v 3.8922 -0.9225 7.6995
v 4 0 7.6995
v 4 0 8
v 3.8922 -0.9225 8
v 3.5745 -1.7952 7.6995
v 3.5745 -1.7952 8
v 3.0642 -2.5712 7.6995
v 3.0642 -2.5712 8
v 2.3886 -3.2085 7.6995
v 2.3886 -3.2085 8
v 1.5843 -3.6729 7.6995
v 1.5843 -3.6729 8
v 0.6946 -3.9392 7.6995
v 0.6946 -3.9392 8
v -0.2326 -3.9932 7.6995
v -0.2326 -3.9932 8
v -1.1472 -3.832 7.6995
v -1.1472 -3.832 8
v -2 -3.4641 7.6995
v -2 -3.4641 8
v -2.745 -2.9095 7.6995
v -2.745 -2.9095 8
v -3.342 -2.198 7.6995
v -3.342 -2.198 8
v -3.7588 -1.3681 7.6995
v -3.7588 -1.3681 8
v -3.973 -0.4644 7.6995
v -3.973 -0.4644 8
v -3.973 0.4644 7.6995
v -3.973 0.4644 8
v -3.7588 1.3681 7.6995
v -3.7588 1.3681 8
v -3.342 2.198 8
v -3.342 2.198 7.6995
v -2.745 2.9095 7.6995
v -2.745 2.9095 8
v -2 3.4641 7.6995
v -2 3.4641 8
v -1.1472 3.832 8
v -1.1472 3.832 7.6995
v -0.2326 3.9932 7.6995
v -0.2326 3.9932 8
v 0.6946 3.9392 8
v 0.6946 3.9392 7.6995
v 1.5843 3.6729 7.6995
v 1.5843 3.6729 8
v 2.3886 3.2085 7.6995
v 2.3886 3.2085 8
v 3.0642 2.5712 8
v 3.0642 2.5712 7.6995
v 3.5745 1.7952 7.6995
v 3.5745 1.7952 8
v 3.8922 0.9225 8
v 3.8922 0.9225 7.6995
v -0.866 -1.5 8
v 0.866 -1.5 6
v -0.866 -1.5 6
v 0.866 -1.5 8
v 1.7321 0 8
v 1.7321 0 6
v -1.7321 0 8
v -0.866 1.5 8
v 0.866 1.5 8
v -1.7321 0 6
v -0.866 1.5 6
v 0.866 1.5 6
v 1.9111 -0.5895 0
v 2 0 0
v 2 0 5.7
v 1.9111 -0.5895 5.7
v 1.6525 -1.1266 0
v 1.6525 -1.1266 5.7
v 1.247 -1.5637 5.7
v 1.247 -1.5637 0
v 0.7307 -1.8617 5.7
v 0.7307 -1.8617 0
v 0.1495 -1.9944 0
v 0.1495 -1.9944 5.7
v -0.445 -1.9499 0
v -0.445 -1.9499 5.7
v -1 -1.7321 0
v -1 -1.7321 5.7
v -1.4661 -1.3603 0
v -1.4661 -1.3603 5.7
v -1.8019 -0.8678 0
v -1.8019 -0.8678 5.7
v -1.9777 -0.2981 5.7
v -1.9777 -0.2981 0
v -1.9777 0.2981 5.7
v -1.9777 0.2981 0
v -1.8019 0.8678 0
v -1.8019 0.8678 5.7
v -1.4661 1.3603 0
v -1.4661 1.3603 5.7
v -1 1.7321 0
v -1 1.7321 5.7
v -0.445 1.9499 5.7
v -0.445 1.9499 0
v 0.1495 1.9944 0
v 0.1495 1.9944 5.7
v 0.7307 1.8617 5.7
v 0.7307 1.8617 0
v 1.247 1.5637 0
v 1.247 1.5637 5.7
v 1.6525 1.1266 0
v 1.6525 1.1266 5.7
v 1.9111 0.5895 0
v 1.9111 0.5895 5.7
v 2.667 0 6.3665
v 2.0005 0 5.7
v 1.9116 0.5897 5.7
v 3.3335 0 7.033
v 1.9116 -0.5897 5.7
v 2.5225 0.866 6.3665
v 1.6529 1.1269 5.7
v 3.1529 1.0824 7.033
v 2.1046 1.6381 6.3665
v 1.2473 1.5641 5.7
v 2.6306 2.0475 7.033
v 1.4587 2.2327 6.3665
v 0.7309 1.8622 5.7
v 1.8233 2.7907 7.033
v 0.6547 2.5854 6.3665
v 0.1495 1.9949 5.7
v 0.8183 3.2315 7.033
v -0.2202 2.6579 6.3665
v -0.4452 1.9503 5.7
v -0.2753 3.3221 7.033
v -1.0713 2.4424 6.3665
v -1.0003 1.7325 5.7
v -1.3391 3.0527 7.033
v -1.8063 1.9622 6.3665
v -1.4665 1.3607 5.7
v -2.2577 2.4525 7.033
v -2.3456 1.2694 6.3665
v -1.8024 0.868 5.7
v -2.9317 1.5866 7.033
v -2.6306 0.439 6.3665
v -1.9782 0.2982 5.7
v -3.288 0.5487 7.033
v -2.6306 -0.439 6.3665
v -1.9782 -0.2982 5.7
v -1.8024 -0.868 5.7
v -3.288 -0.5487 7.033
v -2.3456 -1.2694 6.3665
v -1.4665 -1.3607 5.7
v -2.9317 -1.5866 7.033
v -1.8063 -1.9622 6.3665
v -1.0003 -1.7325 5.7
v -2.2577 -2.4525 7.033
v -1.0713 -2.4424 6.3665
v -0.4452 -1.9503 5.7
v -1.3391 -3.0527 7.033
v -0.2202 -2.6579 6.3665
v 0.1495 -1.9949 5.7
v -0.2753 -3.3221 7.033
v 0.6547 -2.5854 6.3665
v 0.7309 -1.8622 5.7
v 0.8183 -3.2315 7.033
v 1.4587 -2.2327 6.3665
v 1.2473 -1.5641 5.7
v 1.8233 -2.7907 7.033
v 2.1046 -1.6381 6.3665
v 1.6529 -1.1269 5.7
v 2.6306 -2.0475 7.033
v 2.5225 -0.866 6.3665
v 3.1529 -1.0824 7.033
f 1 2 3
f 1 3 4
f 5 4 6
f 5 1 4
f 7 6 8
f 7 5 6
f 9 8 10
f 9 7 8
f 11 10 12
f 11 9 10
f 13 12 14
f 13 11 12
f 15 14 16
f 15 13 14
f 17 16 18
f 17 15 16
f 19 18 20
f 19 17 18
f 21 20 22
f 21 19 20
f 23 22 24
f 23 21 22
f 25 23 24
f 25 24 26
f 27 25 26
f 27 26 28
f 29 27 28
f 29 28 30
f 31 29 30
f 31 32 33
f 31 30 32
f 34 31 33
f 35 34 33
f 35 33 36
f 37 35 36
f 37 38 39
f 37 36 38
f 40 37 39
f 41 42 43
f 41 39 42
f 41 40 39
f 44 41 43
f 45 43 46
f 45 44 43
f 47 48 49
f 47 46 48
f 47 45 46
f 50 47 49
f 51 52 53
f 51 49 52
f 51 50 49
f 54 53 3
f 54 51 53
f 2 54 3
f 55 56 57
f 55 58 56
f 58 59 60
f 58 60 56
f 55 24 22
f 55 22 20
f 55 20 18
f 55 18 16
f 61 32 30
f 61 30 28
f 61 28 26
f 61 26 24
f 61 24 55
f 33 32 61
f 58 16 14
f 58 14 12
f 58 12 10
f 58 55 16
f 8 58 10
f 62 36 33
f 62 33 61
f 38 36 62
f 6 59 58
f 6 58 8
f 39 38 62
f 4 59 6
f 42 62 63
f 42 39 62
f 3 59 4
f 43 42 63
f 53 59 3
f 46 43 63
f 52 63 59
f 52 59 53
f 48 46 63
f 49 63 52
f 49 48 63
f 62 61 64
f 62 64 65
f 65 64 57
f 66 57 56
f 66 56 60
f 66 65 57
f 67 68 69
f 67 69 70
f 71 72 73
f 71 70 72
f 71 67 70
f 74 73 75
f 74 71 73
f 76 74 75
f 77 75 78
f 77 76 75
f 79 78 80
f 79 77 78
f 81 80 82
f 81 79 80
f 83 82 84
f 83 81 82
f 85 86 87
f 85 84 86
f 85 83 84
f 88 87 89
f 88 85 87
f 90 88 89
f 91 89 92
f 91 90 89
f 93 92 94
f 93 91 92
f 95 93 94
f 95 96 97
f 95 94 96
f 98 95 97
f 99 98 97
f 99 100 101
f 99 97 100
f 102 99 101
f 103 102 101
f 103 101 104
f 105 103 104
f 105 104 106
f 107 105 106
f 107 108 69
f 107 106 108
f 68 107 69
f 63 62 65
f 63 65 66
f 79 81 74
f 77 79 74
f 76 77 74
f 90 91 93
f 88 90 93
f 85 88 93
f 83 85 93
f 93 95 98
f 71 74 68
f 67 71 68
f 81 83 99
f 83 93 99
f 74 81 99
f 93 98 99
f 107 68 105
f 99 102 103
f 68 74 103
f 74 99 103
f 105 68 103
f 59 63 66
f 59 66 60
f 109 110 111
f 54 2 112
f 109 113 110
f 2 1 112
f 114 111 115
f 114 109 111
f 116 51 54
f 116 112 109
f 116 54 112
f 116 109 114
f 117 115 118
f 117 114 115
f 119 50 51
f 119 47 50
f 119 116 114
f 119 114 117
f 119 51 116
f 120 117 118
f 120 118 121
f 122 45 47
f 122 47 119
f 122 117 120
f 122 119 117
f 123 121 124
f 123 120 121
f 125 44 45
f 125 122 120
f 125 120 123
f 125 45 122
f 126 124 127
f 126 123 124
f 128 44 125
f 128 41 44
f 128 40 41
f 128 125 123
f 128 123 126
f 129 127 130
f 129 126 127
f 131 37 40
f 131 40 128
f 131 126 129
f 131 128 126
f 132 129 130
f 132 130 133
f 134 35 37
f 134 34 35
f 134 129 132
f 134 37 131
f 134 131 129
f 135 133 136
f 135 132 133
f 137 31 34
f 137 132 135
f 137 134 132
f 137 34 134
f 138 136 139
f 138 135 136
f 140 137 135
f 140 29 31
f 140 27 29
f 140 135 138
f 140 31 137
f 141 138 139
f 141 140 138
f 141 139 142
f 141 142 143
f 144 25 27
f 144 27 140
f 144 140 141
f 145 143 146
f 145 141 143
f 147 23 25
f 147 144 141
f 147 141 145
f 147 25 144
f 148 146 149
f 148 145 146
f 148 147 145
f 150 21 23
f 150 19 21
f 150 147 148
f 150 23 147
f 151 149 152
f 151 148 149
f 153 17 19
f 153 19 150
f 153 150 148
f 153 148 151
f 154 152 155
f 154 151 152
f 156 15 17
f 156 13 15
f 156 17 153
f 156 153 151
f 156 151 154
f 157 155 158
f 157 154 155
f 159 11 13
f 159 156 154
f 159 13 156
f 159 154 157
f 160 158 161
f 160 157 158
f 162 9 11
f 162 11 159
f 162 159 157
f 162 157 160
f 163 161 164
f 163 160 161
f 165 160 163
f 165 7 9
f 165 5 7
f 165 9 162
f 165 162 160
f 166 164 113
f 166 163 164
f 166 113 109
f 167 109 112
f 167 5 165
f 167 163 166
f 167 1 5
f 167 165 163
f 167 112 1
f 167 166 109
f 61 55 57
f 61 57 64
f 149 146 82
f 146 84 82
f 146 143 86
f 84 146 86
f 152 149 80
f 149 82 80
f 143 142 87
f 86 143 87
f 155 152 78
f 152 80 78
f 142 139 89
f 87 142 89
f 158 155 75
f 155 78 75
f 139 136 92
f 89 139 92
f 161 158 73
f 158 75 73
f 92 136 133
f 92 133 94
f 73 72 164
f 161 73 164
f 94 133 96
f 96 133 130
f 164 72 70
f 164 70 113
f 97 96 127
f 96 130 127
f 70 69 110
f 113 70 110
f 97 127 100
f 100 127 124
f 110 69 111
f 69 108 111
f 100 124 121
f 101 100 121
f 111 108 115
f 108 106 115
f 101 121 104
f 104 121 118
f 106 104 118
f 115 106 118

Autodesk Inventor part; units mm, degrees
ref_plane "YZ Plane" through (0, 0, 0) normal (1, 0, 0) x (0, 1, 0)
ref_plane "XZ Plane" through (0, 0, 0) normal (0, 1, 0) x (-1, 0, 0)
ref_plane "XY Plane" through (0, 0, 0) normal (0, 0, 1) x (1, 0, 0)
sketch "スケッチ1" plane through (0, 0, 0) normal (0, 0, 1) x (1, 0, 0)
  circle A0 centre (0, 0) radius 2
  dimension "d0" = 4
extrude "押し出し1" add sketch "スケッチ1" along normal blind 5.7
sketch "スケッチ2" plane through (0, 0, 5.7) normal (0, 0, 1) x (1, 0, 0)
  circle A0 centre (0, 0) radius 4
  dimension "d3" = 8
extrude "押し出し2" add sketch "スケッチ2" along normal blind 2.3
chamfer "面取り1" distance 2 angle 45 1 edges at (-4, 0, 5.7)
sketch "スケッチ3" plane through (0, 0, 8) normal (0, 0, 1) x (1, 0, 0)
  line L0 (1.7321, 0) -> (0.866, -1.5)
  line L1 (0.866, -1.5) -> (-0.866, -1.5)
  line L2 (-0.866, -1.5) -> (-1.7321, 0)
  line L3 (-1.7321, 0) -> (-0.866, 1.5)
  line L4 (-0.866, 1.5) -> (0.866, 1.5)
  line L5 (0.866, 1.5) -> (1.7321, 0)
  point P0 (0, 0)
  point P1 (0, 0)
  dimension "d9" = 3
extrude "押し出し3" cut sketch "スケッチ3" against normal blind 2
thread "ねじ1" size "M4x0.7" class "6g" standard "ANSI Metric M Profile" full length
properties part number "M4皿ネジ　8" material "鉄 灰色"
